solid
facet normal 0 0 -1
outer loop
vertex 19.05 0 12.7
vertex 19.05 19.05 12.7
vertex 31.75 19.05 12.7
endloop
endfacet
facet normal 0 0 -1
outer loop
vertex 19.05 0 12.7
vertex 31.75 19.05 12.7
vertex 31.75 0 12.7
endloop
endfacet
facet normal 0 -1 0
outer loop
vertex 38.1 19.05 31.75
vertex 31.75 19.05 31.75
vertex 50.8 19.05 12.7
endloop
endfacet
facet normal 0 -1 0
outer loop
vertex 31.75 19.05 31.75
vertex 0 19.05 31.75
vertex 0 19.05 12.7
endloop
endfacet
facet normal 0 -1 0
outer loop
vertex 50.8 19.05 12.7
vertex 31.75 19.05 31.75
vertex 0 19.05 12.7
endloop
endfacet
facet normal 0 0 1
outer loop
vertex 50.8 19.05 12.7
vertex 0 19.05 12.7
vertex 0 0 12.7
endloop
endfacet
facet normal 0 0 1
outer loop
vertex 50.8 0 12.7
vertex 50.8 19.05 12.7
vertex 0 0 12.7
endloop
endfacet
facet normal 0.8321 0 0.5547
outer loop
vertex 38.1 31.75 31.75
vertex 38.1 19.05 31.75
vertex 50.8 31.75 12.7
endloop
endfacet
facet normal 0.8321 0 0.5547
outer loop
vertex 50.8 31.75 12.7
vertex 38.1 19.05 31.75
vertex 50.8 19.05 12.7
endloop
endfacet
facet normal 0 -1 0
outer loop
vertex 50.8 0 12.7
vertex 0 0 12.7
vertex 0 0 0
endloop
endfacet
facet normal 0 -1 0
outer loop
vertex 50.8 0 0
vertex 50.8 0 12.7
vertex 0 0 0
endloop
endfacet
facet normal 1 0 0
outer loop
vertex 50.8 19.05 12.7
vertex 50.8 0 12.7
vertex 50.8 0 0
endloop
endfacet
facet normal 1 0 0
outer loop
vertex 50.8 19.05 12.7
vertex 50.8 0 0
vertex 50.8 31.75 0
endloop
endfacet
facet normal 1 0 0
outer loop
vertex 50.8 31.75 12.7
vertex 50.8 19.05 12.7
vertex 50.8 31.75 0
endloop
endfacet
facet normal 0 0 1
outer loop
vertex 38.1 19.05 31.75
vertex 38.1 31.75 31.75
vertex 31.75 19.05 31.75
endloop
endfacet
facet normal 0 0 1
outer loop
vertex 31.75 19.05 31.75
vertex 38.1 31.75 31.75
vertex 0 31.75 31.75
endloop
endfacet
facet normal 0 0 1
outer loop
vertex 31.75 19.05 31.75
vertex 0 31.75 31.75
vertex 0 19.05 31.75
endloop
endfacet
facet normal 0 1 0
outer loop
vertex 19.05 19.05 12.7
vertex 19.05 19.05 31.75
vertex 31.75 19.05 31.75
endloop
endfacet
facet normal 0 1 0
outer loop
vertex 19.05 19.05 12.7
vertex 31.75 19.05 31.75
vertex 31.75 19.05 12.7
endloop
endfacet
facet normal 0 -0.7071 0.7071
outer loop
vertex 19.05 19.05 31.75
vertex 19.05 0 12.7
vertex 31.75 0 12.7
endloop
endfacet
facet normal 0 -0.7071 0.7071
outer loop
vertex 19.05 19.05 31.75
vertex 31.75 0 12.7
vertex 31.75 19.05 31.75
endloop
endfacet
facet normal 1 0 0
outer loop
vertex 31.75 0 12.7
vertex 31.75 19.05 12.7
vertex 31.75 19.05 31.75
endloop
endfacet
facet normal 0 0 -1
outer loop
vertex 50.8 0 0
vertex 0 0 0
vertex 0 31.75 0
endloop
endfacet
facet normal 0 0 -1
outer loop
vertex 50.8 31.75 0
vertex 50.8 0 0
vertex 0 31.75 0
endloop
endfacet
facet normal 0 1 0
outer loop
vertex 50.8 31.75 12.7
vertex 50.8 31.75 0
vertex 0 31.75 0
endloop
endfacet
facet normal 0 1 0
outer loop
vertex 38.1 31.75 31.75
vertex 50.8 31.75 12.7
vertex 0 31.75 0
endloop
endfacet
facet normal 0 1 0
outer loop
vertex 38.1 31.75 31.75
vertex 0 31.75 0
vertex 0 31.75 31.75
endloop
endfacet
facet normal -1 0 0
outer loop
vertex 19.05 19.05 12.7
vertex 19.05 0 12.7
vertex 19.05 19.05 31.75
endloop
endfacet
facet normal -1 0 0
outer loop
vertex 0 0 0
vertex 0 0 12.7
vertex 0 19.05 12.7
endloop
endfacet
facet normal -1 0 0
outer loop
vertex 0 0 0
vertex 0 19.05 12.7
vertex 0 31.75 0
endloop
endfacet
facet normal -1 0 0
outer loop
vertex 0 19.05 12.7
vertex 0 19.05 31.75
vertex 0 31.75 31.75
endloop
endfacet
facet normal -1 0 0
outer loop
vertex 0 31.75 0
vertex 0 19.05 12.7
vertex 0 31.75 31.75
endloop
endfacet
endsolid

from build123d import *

# Parameters (mm, degrees)
F1_DEPTH = 50.8
F3_DEPTH = 25.4
F5_DEPTH = 31.75
F6_W     = 12.7
F6_H     = 26.9407683632
F7_DEPTH = 19.05
F8_W     = 19.05
F8_H     = 26.9407683632
F9_DEPTH = 19.05


with BuildPart() as f1:
    # F0 (on Right) → F1 (new body)
    with BuildSketch(Plane.YZ):
        Polygon((0, 12.7), (0, 0), (31.75, 0), (31.75, 31.75), (19.05, 31.75), (19.05, 12.7), align=None)
    extrude(amount=F1_DEPTH)

    # F2 (on face) → F3 (cut)
    with BuildSketch(Plane.XZ.offset(-19.05)):
        Polygon((38.1, 31.75), (50.8, 12.7), (50.8, 31.75), align=None)
    extrude(amount=-F3_DEPTH, mode=Mode.SUBTRACT)

    # F6 (on face) → F7 (cut)
    with BuildSketch(Plane(origin=(0, -6.35, 6.35), x_dir=(1, 0, 0), z_dir=(0, -0.7071067812, 0.7071067812))):
        with Locations((25.4, 22.4506403027)):
            Rectangle(F6_W, F6_H)
    extrude(amount=F7_DEPTH, mode=Mode.SUBTRACT)


with BuildPart() as f5:
    # F4 (on face) → F5 (new body)
    with BuildSketch(Plane(origin=(0, 0, 0), x_dir=(0, -1, 0), z_dir=(-1, 0, 0))):
        Polygon((0, 12.7), (-19.05, 31.75), (-19.05, 12.7), align=None)
    extrude(amount=-F5_DEPTH)

    # F8 (on face) → F9 (cut)
    with BuildSketch(Plane(origin=(0, -6.35, 6.35), x_dir=(1, 0, 0), z_dir=(0, -0.7071067812, 0.7071067812))):
        with Locations((9.525, 22.4506403027)):
            Rectangle(F8_W, F8_H)
    extrude(amount=-F9_DEPTH, mode=Mode.SUBTRACT)


solid = Compound([f1.part, f5.part])
